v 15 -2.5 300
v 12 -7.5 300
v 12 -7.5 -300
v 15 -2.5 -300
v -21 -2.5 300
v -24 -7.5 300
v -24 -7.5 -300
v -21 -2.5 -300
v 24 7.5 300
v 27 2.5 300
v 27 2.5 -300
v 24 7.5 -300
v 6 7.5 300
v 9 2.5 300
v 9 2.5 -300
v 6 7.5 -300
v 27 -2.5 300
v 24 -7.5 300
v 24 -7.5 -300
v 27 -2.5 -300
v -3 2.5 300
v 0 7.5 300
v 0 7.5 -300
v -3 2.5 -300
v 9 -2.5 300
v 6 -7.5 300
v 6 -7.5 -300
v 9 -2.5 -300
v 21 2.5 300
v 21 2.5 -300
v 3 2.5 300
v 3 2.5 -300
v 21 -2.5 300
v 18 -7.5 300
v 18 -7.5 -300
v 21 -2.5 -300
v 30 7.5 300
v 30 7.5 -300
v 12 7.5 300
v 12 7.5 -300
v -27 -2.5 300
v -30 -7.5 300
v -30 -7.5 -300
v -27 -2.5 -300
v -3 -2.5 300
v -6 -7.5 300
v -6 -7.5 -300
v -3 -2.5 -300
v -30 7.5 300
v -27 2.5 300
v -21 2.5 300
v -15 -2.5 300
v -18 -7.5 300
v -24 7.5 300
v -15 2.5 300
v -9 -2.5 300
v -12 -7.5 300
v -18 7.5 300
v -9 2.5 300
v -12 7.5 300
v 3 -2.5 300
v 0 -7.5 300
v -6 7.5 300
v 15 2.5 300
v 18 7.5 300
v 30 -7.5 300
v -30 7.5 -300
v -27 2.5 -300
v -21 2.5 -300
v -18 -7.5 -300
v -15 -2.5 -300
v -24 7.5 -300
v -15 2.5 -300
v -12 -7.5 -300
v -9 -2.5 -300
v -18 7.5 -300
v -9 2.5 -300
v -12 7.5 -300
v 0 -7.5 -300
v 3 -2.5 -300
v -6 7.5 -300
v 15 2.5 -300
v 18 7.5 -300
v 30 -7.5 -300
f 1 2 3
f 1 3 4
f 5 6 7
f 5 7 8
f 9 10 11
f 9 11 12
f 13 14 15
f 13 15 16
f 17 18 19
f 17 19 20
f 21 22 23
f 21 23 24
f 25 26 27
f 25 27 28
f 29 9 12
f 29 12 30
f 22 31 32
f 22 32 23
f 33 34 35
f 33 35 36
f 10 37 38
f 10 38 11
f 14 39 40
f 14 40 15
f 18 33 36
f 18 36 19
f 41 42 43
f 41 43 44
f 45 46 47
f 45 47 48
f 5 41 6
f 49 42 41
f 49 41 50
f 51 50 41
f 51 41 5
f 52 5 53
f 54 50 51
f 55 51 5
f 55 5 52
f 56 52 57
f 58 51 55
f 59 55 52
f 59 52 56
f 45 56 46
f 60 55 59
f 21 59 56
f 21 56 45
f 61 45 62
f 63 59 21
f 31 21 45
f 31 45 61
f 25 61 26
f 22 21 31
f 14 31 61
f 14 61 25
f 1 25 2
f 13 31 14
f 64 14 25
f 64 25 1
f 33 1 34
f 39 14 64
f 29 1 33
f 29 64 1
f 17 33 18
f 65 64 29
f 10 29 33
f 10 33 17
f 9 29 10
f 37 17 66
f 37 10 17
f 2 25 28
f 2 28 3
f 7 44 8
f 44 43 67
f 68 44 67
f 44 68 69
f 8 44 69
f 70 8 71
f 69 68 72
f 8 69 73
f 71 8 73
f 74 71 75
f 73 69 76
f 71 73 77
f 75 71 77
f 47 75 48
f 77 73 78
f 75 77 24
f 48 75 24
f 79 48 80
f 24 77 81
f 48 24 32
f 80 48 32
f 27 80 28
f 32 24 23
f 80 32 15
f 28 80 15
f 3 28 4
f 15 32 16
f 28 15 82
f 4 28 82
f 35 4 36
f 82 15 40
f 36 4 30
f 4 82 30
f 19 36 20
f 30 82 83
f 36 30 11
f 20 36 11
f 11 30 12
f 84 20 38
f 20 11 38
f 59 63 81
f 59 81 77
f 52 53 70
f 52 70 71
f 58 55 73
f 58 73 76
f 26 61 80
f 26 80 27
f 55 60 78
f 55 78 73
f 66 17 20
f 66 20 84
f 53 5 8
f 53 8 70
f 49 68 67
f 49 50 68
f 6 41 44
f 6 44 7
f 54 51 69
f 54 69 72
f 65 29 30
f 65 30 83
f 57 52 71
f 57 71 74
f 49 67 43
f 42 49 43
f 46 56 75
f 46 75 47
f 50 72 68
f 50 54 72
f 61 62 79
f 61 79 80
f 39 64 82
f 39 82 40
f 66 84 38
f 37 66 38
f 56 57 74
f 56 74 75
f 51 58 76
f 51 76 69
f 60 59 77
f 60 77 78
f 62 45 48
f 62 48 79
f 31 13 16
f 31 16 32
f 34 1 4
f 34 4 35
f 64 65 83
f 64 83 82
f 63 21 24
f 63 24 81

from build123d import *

# Parameters (mm, degrees)
BOSS_EXTRUDE1_DEPTH = 300


with BuildPart() as part:
    # Sketch1 → Boss-Extrude1 (new, symmetric)
    with BuildSketch(Plane.XY):
        Polygon((-30, 7.5), (-30, -7.5), (-27, -2.5), (-24, -7.5), (-21, -2.5), (-18, -7.5), (-15, -2.5), (-12, -7.5), (-9, -2.5), (-6, -7.5), (-3, -2.5), (0, -7.5), (3, -2.5), (6, -7.5), (9, -2.5), (12, -7.5), (15, -2.5), (18, -7.5), (21, -2.5), (24, -7.5), (27, -2.5), (30, -7.5), (30, 7.5), (27, 2.5), (24, 7.5), (21, 2.5), (18, 7.5), (15, 2.5), (12, 7.5), (9, 2.5), (6, 7.5), (3, 2.5), (0, 7.5), (-3, 2.5), (-6, 7.5), (-9, 2.5), (-12, 7.5), (-15, 2.5), (-18, 7.5), (-21, 2.5), (-24, 7.5), (-27, 2.5), align=None)
    extrude(amount=BOSS_EXTRUDE1_DEPTH, both=True)


solid = part.part
